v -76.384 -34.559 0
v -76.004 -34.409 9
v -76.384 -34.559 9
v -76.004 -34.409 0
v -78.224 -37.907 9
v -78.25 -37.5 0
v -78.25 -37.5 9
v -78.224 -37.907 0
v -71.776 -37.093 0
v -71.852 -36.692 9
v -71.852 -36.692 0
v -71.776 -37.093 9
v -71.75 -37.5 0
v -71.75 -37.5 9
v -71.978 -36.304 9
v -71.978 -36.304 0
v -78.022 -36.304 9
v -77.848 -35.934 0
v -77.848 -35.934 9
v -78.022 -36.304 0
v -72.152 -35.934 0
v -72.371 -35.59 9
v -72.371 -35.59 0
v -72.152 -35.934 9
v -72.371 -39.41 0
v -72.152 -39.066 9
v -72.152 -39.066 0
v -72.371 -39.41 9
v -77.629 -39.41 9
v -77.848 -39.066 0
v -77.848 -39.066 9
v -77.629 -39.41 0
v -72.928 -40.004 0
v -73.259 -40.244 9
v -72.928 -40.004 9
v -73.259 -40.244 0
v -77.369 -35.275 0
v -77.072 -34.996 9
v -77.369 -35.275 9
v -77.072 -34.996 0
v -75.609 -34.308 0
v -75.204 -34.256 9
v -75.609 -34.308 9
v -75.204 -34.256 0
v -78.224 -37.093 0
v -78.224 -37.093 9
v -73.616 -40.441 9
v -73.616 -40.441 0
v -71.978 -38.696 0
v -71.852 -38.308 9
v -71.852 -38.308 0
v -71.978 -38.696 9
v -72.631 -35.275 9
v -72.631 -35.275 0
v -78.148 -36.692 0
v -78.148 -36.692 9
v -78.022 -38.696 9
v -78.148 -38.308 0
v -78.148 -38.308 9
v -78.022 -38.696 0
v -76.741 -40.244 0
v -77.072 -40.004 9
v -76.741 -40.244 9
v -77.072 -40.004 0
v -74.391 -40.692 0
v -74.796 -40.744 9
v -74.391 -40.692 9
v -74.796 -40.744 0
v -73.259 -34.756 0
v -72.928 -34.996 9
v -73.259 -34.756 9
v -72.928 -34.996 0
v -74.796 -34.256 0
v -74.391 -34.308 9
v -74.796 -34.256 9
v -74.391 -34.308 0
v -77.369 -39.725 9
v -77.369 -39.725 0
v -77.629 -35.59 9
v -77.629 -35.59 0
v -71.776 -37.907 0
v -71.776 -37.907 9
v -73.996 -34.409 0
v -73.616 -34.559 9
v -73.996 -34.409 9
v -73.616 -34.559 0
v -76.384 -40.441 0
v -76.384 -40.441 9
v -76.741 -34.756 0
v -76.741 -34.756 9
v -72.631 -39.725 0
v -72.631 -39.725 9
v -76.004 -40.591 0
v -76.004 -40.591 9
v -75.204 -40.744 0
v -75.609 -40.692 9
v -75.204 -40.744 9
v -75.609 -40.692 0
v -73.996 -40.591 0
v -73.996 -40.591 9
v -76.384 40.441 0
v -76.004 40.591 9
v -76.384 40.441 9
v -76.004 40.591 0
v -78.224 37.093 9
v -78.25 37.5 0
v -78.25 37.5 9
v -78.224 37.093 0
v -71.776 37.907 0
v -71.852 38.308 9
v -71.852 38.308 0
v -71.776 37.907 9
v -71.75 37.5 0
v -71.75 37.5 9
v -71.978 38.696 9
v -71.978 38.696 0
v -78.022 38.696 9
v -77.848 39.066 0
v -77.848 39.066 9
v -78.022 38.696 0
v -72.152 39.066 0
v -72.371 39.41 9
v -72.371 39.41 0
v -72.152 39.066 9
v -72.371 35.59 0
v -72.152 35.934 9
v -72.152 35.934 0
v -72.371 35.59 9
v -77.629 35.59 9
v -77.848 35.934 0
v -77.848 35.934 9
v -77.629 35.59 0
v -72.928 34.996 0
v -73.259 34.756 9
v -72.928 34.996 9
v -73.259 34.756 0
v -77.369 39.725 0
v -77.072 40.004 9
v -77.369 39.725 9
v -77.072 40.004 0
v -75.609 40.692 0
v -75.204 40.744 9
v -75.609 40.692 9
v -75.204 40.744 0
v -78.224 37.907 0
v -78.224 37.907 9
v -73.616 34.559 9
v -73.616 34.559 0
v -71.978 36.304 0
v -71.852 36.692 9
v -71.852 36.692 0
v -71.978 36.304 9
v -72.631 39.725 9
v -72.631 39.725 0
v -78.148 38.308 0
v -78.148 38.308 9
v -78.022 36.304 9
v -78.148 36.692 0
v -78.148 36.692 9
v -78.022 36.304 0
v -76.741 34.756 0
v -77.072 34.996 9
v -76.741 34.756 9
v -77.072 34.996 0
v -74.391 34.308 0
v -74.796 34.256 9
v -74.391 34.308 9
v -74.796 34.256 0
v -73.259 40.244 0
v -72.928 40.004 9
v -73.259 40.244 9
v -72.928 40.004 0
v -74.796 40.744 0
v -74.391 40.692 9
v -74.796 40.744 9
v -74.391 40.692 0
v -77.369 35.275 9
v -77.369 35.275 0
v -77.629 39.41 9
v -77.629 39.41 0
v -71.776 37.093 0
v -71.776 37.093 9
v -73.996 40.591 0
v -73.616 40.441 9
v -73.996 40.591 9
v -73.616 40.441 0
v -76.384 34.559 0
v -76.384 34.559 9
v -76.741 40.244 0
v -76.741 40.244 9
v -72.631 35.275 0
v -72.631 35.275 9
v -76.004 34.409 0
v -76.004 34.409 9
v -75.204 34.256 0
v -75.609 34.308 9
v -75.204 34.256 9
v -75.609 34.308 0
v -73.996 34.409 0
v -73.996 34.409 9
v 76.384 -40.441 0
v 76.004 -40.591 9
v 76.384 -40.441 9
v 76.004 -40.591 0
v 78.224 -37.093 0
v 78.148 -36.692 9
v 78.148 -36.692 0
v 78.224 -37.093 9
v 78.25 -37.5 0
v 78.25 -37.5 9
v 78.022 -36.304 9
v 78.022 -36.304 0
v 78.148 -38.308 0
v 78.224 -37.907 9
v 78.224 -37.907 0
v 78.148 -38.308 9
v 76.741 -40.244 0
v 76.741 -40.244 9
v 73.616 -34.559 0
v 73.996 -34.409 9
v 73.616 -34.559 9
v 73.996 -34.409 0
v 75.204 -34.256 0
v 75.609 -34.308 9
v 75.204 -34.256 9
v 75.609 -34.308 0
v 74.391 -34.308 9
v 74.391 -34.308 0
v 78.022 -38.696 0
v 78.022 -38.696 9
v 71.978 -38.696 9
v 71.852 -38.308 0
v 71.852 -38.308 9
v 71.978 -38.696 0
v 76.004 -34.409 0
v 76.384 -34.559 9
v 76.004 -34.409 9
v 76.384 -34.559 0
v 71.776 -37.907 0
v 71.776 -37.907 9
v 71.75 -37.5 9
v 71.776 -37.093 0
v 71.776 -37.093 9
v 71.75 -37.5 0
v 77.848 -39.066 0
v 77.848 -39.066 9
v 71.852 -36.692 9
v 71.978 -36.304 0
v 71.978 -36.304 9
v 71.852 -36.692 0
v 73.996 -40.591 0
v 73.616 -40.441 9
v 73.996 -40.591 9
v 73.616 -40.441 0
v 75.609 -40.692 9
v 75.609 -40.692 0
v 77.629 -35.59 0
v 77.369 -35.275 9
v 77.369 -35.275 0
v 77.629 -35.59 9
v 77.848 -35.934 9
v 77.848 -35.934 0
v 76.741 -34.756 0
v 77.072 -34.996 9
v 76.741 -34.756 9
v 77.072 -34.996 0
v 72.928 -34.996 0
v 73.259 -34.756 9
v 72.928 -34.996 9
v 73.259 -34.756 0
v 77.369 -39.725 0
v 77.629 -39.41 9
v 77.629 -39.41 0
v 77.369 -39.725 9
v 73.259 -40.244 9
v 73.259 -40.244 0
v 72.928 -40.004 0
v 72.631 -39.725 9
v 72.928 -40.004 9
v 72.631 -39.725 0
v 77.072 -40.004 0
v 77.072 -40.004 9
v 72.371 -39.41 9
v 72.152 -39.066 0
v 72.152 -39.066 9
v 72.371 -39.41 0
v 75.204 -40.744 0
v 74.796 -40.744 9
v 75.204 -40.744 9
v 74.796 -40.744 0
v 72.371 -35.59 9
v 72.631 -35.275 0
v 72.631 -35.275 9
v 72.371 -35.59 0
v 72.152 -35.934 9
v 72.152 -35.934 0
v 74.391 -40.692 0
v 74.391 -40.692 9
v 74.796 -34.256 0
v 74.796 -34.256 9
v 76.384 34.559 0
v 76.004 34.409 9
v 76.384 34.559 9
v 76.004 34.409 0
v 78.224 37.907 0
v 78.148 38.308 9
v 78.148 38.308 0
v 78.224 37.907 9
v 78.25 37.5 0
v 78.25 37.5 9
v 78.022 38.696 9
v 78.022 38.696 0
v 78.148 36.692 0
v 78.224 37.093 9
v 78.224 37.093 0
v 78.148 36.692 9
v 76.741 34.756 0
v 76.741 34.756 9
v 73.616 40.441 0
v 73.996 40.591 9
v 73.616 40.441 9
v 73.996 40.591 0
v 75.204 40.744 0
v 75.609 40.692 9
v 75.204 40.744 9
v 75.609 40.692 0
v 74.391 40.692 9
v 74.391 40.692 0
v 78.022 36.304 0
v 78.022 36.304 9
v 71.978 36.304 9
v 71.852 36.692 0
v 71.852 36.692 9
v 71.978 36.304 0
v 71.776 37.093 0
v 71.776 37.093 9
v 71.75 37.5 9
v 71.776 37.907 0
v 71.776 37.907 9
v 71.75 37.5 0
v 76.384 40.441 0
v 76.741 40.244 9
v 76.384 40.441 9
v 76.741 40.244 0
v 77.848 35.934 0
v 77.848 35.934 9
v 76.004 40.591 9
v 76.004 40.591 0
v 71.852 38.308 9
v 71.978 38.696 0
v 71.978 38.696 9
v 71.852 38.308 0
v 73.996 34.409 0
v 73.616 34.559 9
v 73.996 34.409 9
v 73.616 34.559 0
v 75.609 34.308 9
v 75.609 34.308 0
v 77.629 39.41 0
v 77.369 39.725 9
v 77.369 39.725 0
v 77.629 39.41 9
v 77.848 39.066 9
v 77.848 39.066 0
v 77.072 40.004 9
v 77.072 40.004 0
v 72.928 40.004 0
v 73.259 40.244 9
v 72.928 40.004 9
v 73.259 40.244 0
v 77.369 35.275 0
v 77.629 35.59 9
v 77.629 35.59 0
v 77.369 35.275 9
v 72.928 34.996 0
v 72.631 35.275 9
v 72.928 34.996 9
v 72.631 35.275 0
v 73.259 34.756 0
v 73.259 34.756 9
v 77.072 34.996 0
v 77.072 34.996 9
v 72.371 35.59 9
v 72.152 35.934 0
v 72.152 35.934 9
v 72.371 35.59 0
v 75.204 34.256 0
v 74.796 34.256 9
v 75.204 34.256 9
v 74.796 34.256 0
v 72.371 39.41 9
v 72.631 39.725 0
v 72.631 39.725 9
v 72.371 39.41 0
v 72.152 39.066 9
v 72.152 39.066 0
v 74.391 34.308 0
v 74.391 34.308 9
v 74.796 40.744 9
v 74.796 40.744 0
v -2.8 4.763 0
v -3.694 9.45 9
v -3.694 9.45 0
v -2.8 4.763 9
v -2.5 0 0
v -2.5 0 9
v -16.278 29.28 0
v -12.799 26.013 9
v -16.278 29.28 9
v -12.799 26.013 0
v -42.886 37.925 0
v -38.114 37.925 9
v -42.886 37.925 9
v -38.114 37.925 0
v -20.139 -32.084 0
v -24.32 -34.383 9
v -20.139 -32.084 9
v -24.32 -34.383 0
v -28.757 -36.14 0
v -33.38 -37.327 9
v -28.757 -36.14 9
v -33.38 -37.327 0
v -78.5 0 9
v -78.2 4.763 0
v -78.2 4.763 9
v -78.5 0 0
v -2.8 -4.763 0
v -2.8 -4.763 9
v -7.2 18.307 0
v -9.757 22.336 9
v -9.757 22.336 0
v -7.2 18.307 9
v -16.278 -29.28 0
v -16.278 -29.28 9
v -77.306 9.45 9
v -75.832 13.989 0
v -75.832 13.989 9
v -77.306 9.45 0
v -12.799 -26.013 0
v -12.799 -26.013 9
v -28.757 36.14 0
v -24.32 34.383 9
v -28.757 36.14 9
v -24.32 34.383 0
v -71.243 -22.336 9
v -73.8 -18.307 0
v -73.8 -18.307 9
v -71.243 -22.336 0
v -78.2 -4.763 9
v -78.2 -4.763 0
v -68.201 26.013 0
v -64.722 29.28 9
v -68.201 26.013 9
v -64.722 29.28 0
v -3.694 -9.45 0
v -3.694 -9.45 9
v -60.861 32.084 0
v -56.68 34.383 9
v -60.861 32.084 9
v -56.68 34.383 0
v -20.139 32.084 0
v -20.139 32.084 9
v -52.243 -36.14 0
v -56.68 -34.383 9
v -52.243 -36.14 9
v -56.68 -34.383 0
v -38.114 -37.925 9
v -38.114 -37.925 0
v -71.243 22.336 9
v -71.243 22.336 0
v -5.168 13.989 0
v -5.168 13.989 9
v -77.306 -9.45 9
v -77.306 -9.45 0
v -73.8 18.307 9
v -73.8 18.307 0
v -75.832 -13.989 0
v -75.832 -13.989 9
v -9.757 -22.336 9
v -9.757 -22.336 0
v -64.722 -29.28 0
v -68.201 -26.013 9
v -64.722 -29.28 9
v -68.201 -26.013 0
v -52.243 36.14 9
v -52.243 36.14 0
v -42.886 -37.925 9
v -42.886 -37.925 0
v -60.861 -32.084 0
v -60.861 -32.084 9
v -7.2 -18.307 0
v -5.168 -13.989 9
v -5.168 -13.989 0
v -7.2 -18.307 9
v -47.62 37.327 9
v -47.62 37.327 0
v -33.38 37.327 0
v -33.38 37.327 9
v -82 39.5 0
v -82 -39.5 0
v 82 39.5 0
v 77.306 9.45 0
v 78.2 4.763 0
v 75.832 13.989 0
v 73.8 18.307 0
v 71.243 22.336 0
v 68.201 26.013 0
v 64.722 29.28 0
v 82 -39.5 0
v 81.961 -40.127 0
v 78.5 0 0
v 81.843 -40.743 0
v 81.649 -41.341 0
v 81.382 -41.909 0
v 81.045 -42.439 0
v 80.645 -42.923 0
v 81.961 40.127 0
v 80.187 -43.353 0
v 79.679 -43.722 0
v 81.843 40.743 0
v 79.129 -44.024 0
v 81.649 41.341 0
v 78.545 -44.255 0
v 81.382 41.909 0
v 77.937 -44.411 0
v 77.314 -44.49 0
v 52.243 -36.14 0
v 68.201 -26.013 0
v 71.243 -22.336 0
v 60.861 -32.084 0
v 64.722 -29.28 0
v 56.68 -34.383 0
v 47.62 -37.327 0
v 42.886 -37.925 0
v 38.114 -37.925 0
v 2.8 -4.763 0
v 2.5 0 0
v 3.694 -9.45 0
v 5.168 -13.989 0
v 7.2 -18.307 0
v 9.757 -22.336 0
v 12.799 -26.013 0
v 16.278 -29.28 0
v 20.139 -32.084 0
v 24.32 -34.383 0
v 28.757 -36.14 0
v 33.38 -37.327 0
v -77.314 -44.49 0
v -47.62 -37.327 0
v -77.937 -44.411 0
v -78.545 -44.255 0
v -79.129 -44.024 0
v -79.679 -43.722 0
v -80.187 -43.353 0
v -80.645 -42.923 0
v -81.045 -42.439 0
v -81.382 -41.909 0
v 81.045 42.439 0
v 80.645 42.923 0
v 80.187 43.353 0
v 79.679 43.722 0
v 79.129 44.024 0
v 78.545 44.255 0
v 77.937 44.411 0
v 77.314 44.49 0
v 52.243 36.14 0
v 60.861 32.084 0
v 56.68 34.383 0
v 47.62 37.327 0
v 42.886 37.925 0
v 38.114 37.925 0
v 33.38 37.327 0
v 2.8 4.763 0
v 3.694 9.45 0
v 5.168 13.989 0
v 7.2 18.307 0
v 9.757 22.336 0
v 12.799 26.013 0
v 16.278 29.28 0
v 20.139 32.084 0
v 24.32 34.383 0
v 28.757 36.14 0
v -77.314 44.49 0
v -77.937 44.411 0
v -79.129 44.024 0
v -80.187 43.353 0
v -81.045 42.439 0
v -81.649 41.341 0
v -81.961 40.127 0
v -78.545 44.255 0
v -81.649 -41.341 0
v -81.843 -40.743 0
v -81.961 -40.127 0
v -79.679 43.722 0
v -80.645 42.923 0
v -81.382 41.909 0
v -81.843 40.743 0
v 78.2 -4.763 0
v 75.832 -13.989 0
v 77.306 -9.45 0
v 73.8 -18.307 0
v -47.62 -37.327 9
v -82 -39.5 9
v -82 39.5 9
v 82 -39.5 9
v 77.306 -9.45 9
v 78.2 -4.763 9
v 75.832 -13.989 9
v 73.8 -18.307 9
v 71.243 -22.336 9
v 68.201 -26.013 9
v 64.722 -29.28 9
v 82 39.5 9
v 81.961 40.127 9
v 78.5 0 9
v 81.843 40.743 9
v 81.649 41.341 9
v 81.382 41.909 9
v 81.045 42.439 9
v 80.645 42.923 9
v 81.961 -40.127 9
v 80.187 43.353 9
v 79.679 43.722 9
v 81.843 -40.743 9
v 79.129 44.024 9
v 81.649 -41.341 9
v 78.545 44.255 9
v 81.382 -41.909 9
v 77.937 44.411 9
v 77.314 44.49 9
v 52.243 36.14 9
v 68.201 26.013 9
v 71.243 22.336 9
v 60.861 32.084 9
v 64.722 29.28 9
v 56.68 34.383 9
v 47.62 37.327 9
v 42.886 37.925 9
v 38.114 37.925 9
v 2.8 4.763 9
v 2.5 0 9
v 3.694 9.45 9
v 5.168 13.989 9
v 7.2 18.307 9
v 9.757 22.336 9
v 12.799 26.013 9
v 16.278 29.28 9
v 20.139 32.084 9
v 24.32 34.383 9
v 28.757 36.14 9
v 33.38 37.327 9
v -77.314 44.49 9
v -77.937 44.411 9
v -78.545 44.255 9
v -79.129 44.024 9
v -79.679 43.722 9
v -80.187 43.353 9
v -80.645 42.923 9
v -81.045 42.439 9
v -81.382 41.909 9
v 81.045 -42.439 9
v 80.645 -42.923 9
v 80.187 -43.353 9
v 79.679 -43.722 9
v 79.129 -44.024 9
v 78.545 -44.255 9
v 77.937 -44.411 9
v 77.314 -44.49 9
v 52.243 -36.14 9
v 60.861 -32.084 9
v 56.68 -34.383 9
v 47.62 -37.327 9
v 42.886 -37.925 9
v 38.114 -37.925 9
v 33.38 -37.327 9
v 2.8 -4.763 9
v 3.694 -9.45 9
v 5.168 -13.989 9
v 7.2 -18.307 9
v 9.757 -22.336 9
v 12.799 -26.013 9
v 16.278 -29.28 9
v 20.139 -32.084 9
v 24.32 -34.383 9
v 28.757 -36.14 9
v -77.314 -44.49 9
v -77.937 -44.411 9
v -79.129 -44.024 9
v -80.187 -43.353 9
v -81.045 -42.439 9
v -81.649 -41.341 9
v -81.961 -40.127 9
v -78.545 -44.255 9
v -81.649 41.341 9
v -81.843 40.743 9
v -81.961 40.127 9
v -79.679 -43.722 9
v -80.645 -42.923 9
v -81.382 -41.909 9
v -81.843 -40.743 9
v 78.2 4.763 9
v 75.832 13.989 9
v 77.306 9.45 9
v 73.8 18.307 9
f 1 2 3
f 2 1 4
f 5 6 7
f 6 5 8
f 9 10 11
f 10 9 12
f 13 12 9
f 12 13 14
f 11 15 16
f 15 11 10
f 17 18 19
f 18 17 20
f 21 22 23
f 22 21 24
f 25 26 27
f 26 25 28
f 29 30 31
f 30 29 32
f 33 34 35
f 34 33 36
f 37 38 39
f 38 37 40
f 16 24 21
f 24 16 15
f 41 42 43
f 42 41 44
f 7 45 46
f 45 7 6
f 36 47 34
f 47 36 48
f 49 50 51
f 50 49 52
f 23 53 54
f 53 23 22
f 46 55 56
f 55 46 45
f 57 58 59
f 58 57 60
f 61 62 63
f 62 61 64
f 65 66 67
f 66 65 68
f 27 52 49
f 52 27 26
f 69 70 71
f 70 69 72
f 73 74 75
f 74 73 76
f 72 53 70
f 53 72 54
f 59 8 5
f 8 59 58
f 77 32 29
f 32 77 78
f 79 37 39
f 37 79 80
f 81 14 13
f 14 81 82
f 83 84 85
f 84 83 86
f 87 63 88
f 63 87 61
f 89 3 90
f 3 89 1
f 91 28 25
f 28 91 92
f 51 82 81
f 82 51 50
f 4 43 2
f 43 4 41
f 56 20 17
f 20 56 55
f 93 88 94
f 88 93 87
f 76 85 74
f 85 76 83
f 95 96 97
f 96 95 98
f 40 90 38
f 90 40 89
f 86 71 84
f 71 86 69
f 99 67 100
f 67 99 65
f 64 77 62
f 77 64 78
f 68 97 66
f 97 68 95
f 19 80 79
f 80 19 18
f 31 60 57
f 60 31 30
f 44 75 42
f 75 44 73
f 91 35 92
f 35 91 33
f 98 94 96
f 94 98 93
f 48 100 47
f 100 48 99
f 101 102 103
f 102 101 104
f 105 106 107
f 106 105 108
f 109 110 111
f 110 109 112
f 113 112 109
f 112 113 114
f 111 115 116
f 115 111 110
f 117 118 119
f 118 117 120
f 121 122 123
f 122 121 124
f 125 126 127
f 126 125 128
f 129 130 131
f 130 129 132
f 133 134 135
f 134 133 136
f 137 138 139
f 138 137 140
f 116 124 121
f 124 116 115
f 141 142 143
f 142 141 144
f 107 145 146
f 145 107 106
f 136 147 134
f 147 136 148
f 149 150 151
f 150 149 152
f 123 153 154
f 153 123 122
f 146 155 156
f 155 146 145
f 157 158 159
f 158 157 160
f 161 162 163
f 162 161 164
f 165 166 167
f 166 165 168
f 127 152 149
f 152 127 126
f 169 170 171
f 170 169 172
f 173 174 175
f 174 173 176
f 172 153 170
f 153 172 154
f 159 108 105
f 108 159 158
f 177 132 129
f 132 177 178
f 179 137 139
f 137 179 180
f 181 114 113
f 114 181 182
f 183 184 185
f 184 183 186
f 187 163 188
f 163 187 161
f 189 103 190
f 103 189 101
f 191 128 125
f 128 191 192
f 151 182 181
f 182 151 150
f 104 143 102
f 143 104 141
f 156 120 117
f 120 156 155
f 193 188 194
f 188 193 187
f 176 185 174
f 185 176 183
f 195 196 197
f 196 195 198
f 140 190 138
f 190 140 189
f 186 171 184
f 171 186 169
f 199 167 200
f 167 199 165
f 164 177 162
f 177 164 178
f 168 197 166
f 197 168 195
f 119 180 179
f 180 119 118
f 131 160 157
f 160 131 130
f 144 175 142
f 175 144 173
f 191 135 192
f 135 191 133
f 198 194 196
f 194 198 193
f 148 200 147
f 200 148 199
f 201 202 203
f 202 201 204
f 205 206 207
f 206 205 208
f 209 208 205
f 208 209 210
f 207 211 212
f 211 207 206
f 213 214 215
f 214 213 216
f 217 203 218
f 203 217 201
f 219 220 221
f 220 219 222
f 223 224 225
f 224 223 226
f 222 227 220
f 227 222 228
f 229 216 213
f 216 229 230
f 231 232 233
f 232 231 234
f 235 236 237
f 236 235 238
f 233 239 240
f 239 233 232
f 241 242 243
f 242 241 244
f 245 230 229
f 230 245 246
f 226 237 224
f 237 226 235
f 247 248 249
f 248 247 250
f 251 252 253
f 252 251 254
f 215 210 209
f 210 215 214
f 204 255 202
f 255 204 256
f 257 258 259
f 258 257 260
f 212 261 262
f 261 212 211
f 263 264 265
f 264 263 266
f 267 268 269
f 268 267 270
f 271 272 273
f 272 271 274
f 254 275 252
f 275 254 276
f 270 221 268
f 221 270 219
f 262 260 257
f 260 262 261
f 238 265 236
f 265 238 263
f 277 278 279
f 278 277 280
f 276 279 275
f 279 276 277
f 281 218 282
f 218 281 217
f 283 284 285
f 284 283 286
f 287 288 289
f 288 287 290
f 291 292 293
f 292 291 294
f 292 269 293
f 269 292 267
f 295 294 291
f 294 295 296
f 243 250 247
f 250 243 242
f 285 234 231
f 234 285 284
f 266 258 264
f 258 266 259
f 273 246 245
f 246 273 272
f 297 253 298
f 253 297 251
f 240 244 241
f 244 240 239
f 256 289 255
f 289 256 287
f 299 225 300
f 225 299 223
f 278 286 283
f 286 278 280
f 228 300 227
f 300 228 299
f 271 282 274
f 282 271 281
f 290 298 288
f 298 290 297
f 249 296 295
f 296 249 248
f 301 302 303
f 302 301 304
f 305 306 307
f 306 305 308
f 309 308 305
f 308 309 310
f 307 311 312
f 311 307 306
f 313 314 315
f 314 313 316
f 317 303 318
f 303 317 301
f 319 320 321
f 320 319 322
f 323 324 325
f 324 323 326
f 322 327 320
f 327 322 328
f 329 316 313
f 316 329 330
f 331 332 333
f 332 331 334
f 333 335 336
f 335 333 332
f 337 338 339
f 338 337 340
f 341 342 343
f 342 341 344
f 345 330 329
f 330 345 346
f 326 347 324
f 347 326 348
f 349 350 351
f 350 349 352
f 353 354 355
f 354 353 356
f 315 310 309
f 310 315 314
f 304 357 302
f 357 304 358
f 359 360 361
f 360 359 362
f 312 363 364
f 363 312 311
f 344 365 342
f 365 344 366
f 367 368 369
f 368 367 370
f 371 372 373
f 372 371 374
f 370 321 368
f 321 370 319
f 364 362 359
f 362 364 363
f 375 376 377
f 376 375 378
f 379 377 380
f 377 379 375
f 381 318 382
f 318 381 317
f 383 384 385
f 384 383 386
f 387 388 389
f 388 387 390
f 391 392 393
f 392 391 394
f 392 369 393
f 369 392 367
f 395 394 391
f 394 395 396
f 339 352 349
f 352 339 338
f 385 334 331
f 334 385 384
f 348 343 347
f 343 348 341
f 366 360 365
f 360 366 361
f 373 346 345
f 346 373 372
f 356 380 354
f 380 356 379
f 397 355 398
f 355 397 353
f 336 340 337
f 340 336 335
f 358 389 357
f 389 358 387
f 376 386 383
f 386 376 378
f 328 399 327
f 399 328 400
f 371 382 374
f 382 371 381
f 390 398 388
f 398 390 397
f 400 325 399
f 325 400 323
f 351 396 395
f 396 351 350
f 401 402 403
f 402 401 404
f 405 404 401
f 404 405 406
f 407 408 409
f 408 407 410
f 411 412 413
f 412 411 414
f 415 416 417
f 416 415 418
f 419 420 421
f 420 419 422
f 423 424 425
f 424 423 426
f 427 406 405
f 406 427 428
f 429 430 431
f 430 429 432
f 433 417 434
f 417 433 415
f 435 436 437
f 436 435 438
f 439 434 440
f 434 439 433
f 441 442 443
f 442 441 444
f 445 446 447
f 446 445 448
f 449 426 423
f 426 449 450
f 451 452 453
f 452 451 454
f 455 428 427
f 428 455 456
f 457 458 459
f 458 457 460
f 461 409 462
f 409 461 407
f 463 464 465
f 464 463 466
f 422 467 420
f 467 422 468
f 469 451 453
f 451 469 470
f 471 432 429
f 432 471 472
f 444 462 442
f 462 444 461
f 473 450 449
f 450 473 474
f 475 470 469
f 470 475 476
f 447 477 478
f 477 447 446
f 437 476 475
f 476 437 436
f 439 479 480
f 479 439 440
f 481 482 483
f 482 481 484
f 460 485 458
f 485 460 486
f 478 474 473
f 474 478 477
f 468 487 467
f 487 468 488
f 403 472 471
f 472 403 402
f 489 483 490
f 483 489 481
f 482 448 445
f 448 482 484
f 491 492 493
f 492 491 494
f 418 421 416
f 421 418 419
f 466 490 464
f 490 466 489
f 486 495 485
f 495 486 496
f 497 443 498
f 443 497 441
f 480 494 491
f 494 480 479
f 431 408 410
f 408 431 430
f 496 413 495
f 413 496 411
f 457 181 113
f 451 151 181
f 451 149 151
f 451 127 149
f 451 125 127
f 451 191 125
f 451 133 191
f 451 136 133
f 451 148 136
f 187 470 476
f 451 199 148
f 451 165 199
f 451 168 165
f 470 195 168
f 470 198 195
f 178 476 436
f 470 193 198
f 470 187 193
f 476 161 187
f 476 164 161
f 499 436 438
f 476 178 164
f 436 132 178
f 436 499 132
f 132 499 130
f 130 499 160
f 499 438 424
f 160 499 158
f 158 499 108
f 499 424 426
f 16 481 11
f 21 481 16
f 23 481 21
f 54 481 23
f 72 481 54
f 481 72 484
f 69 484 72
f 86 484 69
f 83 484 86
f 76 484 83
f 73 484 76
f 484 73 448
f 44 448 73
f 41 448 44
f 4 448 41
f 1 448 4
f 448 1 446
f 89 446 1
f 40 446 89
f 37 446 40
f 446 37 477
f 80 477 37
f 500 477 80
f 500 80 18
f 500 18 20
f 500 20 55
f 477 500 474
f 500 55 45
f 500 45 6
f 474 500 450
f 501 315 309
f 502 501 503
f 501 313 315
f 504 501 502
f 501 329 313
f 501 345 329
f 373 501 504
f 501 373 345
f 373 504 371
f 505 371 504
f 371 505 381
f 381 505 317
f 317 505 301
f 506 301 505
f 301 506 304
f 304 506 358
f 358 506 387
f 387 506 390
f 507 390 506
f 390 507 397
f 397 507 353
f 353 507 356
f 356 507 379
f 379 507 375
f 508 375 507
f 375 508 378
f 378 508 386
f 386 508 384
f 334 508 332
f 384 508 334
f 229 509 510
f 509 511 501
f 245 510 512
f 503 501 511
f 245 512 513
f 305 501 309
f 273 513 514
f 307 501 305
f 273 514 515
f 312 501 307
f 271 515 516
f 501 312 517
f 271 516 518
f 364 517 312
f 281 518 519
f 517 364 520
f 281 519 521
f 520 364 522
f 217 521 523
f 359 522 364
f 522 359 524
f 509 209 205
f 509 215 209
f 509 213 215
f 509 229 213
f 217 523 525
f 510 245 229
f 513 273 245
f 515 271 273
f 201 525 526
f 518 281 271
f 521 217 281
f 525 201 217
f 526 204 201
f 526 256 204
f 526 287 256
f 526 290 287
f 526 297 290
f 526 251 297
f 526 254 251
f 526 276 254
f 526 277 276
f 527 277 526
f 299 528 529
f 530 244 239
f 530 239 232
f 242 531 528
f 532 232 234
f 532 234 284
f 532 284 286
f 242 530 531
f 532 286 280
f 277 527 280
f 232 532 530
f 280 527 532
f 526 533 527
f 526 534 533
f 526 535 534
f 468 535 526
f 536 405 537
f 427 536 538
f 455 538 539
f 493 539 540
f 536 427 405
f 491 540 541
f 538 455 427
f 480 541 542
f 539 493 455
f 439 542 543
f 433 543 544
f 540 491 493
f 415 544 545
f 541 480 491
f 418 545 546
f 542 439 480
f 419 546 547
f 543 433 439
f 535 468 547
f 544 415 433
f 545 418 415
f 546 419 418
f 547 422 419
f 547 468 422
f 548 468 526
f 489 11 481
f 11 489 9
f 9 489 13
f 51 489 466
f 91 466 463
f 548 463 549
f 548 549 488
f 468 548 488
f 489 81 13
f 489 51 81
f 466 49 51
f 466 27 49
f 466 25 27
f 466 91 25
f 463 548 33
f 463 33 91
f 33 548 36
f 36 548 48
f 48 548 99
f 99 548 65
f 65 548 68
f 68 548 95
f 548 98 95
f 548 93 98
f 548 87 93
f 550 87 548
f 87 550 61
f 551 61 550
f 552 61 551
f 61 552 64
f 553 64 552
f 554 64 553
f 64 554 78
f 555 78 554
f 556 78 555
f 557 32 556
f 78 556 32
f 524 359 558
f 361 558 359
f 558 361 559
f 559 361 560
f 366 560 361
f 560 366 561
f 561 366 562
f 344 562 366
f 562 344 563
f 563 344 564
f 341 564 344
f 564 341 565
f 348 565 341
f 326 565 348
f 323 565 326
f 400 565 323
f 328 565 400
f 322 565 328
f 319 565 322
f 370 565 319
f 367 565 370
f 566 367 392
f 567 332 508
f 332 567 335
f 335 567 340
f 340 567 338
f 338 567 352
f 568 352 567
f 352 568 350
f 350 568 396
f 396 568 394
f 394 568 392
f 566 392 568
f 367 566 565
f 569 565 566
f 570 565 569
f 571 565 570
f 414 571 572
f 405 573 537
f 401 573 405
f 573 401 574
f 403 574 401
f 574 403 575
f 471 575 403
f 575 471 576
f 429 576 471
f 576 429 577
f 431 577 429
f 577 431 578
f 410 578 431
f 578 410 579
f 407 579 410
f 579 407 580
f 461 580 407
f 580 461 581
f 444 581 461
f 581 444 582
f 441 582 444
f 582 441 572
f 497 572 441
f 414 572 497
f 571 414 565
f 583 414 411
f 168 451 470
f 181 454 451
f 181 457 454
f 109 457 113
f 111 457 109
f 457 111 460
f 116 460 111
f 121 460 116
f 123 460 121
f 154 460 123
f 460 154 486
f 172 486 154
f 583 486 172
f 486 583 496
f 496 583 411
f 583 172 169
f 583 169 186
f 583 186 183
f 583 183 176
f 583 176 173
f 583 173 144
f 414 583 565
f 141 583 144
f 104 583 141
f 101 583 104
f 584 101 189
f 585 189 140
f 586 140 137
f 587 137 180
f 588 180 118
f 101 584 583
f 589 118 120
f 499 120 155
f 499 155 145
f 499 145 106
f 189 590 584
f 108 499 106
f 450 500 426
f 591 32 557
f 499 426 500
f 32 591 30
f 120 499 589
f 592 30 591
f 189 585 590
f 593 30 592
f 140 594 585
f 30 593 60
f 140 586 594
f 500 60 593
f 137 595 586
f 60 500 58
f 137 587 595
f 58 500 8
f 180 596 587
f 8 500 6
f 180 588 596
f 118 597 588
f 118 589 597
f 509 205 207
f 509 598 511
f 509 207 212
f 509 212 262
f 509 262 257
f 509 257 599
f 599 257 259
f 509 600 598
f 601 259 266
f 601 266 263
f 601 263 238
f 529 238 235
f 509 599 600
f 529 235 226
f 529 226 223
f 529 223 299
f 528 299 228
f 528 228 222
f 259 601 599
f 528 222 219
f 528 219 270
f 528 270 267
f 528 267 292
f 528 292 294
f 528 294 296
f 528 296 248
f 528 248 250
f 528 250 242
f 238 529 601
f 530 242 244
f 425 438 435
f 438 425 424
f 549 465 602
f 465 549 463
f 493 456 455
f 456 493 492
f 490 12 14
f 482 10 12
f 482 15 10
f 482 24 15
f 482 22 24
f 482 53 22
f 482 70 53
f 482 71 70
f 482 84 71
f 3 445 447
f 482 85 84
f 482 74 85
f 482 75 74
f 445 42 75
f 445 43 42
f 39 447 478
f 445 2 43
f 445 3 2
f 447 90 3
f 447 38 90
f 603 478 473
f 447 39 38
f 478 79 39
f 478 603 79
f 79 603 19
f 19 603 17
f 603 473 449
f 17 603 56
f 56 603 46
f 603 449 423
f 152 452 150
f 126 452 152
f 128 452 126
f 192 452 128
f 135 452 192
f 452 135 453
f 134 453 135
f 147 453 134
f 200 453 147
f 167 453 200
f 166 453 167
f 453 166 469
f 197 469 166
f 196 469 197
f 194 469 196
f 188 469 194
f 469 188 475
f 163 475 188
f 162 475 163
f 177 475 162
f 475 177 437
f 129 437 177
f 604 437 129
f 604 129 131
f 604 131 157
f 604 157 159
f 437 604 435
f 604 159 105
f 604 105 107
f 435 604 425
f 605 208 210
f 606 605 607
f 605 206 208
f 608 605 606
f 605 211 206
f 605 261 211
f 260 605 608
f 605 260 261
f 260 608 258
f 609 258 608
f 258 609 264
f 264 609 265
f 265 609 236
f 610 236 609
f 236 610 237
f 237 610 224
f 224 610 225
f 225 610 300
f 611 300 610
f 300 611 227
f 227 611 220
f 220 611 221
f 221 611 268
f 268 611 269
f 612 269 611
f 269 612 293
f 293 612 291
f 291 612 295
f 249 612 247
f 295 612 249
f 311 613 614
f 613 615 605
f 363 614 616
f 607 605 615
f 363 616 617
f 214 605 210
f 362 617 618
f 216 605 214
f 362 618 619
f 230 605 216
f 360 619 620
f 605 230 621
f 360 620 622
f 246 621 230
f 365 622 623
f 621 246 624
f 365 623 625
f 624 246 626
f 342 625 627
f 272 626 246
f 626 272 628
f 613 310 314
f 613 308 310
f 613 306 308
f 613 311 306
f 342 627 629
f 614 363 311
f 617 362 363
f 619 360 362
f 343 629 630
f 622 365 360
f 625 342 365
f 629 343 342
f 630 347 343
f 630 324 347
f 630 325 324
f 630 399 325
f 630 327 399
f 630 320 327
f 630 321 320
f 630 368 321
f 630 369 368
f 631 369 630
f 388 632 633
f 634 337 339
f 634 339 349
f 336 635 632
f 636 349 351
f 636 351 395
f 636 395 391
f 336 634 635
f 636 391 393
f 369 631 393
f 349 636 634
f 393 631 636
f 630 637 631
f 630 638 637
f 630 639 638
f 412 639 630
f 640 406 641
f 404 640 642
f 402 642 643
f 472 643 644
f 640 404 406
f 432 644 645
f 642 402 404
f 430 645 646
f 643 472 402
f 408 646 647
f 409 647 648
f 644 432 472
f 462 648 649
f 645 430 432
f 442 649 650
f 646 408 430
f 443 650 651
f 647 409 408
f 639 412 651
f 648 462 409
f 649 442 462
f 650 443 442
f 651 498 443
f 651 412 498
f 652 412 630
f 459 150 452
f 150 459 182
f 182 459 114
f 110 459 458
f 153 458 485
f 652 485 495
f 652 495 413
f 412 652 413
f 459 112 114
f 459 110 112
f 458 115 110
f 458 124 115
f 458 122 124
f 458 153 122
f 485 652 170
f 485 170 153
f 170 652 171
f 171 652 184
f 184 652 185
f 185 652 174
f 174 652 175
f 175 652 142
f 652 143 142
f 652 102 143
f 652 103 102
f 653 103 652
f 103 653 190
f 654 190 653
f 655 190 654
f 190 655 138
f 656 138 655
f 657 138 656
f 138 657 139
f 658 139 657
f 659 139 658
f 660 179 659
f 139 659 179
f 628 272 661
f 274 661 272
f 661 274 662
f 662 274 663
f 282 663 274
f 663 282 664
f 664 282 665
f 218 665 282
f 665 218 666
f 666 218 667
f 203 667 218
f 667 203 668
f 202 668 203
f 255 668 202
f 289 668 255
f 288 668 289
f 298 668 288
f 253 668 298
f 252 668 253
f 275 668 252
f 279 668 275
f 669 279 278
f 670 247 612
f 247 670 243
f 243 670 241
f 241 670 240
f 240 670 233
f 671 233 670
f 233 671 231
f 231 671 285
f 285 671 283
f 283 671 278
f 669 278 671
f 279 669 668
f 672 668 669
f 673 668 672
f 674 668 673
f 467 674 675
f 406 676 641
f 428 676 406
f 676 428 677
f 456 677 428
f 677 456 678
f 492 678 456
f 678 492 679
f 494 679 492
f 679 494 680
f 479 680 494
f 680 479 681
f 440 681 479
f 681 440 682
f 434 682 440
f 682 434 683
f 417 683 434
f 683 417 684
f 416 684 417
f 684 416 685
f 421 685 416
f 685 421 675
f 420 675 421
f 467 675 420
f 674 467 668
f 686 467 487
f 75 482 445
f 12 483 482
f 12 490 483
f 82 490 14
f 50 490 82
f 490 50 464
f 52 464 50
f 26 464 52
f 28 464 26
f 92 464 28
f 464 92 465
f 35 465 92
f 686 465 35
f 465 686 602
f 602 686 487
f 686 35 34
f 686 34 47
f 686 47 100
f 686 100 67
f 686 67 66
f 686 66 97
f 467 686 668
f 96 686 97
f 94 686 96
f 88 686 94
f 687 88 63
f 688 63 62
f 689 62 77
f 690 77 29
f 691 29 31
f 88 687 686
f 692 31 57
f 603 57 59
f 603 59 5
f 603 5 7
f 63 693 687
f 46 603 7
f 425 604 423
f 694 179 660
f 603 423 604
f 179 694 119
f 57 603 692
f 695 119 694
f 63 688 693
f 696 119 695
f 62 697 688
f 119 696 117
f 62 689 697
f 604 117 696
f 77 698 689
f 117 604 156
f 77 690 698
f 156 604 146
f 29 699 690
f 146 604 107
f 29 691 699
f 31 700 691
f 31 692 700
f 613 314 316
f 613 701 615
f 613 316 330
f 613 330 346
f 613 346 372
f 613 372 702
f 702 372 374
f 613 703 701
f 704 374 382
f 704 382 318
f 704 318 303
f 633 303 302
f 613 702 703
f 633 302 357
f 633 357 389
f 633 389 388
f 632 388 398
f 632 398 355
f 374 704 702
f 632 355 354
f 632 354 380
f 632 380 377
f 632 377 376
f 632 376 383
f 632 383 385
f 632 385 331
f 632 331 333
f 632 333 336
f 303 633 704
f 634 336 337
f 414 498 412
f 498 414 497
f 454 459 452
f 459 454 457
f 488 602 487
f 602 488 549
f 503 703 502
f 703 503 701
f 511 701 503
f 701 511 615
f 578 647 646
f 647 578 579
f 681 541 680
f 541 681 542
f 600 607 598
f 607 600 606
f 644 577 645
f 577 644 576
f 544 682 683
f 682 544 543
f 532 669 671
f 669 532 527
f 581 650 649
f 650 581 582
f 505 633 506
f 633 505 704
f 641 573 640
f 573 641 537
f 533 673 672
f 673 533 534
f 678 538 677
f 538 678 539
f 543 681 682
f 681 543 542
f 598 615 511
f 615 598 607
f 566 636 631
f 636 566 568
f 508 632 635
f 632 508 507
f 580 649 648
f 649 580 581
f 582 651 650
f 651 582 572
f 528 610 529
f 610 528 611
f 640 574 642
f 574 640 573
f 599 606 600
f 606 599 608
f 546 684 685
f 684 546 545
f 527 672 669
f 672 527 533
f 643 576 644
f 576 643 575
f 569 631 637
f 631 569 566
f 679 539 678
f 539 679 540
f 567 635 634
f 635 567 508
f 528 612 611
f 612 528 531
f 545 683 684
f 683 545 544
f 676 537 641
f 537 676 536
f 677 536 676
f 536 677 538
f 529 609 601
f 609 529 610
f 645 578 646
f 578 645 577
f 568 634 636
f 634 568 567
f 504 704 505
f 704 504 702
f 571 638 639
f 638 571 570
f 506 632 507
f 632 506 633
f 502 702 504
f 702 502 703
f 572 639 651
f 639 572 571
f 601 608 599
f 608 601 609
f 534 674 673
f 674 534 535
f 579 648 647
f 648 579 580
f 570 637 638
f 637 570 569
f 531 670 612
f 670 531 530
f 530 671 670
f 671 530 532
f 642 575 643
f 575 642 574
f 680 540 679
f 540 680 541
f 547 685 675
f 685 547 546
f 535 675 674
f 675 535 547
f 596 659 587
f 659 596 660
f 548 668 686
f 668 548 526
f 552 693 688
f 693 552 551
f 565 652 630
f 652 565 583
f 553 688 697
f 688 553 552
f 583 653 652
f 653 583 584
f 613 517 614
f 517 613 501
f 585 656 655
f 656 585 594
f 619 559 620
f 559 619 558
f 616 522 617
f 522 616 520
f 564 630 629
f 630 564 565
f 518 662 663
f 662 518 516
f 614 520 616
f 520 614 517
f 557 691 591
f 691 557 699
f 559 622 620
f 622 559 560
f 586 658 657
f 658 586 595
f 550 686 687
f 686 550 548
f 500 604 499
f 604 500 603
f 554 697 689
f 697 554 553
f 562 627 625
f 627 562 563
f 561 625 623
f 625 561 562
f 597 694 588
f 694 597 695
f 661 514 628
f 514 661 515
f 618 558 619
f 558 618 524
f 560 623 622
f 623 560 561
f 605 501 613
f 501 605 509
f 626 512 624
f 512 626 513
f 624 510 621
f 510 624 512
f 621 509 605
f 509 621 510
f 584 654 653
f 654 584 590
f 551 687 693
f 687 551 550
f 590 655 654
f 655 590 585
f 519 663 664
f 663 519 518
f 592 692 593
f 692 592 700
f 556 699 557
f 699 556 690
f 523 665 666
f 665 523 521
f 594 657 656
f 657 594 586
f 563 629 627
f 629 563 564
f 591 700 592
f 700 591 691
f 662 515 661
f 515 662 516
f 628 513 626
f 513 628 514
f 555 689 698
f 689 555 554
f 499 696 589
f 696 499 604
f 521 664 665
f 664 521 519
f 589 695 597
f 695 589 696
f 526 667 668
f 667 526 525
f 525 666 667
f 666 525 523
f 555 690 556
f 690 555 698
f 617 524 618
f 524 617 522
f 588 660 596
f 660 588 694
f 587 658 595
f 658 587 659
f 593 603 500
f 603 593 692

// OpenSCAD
$fn = 50;


difference() {
	union() {
		hull() {
			translate(v = [-77.0000000000, 39.5000000000, 0]) {
				cylinder(h = 9, r = 5);
			}
			translate(v = [77.0000000000, 39.5000000000, 0]) {
				cylinder(h = 9, r = 5);
			}
			translate(v = [-77.0000000000, -39.5000000000, 0]) {
				cylinder(h = 9, r = 5);
			}
			translate(v = [77.0000000000, -39.5000000000, 0]) {
				cylinder(h = 9, r = 5);
			}
		}
	}
	union() {
		#translate(v = [-75.0000000000, -37.5000000000, -100.0000000000]) {
			cylinder(h = 200, r = 3.2500000000);
		}
		#translate(v = [-75.0000000000, 37.5000000000, -100.0000000000]) {
			cylinder(h = 200, r = 3.2500000000);
		}
		#translate(v = [75.0000000000, -37.5000000000, -100.0000000000]) {
			cylinder(h = 200, r = 3.2500000000);
		}
		#translate(v = [75.0000000000, 37.5000000000, -100.0000000000]) {
			cylinder(h = 200, r = 3.2500000000);
		}
		#translate(v = [-40.5000000000, 0, 0]) {
			cylinder(h = 9, r = 38.0000000000);
		}
		#translate(v = [40.5000000000, 0, 0]) {
			cylinder(h = 9, r = 38.0000000000);
		}
	}
}
